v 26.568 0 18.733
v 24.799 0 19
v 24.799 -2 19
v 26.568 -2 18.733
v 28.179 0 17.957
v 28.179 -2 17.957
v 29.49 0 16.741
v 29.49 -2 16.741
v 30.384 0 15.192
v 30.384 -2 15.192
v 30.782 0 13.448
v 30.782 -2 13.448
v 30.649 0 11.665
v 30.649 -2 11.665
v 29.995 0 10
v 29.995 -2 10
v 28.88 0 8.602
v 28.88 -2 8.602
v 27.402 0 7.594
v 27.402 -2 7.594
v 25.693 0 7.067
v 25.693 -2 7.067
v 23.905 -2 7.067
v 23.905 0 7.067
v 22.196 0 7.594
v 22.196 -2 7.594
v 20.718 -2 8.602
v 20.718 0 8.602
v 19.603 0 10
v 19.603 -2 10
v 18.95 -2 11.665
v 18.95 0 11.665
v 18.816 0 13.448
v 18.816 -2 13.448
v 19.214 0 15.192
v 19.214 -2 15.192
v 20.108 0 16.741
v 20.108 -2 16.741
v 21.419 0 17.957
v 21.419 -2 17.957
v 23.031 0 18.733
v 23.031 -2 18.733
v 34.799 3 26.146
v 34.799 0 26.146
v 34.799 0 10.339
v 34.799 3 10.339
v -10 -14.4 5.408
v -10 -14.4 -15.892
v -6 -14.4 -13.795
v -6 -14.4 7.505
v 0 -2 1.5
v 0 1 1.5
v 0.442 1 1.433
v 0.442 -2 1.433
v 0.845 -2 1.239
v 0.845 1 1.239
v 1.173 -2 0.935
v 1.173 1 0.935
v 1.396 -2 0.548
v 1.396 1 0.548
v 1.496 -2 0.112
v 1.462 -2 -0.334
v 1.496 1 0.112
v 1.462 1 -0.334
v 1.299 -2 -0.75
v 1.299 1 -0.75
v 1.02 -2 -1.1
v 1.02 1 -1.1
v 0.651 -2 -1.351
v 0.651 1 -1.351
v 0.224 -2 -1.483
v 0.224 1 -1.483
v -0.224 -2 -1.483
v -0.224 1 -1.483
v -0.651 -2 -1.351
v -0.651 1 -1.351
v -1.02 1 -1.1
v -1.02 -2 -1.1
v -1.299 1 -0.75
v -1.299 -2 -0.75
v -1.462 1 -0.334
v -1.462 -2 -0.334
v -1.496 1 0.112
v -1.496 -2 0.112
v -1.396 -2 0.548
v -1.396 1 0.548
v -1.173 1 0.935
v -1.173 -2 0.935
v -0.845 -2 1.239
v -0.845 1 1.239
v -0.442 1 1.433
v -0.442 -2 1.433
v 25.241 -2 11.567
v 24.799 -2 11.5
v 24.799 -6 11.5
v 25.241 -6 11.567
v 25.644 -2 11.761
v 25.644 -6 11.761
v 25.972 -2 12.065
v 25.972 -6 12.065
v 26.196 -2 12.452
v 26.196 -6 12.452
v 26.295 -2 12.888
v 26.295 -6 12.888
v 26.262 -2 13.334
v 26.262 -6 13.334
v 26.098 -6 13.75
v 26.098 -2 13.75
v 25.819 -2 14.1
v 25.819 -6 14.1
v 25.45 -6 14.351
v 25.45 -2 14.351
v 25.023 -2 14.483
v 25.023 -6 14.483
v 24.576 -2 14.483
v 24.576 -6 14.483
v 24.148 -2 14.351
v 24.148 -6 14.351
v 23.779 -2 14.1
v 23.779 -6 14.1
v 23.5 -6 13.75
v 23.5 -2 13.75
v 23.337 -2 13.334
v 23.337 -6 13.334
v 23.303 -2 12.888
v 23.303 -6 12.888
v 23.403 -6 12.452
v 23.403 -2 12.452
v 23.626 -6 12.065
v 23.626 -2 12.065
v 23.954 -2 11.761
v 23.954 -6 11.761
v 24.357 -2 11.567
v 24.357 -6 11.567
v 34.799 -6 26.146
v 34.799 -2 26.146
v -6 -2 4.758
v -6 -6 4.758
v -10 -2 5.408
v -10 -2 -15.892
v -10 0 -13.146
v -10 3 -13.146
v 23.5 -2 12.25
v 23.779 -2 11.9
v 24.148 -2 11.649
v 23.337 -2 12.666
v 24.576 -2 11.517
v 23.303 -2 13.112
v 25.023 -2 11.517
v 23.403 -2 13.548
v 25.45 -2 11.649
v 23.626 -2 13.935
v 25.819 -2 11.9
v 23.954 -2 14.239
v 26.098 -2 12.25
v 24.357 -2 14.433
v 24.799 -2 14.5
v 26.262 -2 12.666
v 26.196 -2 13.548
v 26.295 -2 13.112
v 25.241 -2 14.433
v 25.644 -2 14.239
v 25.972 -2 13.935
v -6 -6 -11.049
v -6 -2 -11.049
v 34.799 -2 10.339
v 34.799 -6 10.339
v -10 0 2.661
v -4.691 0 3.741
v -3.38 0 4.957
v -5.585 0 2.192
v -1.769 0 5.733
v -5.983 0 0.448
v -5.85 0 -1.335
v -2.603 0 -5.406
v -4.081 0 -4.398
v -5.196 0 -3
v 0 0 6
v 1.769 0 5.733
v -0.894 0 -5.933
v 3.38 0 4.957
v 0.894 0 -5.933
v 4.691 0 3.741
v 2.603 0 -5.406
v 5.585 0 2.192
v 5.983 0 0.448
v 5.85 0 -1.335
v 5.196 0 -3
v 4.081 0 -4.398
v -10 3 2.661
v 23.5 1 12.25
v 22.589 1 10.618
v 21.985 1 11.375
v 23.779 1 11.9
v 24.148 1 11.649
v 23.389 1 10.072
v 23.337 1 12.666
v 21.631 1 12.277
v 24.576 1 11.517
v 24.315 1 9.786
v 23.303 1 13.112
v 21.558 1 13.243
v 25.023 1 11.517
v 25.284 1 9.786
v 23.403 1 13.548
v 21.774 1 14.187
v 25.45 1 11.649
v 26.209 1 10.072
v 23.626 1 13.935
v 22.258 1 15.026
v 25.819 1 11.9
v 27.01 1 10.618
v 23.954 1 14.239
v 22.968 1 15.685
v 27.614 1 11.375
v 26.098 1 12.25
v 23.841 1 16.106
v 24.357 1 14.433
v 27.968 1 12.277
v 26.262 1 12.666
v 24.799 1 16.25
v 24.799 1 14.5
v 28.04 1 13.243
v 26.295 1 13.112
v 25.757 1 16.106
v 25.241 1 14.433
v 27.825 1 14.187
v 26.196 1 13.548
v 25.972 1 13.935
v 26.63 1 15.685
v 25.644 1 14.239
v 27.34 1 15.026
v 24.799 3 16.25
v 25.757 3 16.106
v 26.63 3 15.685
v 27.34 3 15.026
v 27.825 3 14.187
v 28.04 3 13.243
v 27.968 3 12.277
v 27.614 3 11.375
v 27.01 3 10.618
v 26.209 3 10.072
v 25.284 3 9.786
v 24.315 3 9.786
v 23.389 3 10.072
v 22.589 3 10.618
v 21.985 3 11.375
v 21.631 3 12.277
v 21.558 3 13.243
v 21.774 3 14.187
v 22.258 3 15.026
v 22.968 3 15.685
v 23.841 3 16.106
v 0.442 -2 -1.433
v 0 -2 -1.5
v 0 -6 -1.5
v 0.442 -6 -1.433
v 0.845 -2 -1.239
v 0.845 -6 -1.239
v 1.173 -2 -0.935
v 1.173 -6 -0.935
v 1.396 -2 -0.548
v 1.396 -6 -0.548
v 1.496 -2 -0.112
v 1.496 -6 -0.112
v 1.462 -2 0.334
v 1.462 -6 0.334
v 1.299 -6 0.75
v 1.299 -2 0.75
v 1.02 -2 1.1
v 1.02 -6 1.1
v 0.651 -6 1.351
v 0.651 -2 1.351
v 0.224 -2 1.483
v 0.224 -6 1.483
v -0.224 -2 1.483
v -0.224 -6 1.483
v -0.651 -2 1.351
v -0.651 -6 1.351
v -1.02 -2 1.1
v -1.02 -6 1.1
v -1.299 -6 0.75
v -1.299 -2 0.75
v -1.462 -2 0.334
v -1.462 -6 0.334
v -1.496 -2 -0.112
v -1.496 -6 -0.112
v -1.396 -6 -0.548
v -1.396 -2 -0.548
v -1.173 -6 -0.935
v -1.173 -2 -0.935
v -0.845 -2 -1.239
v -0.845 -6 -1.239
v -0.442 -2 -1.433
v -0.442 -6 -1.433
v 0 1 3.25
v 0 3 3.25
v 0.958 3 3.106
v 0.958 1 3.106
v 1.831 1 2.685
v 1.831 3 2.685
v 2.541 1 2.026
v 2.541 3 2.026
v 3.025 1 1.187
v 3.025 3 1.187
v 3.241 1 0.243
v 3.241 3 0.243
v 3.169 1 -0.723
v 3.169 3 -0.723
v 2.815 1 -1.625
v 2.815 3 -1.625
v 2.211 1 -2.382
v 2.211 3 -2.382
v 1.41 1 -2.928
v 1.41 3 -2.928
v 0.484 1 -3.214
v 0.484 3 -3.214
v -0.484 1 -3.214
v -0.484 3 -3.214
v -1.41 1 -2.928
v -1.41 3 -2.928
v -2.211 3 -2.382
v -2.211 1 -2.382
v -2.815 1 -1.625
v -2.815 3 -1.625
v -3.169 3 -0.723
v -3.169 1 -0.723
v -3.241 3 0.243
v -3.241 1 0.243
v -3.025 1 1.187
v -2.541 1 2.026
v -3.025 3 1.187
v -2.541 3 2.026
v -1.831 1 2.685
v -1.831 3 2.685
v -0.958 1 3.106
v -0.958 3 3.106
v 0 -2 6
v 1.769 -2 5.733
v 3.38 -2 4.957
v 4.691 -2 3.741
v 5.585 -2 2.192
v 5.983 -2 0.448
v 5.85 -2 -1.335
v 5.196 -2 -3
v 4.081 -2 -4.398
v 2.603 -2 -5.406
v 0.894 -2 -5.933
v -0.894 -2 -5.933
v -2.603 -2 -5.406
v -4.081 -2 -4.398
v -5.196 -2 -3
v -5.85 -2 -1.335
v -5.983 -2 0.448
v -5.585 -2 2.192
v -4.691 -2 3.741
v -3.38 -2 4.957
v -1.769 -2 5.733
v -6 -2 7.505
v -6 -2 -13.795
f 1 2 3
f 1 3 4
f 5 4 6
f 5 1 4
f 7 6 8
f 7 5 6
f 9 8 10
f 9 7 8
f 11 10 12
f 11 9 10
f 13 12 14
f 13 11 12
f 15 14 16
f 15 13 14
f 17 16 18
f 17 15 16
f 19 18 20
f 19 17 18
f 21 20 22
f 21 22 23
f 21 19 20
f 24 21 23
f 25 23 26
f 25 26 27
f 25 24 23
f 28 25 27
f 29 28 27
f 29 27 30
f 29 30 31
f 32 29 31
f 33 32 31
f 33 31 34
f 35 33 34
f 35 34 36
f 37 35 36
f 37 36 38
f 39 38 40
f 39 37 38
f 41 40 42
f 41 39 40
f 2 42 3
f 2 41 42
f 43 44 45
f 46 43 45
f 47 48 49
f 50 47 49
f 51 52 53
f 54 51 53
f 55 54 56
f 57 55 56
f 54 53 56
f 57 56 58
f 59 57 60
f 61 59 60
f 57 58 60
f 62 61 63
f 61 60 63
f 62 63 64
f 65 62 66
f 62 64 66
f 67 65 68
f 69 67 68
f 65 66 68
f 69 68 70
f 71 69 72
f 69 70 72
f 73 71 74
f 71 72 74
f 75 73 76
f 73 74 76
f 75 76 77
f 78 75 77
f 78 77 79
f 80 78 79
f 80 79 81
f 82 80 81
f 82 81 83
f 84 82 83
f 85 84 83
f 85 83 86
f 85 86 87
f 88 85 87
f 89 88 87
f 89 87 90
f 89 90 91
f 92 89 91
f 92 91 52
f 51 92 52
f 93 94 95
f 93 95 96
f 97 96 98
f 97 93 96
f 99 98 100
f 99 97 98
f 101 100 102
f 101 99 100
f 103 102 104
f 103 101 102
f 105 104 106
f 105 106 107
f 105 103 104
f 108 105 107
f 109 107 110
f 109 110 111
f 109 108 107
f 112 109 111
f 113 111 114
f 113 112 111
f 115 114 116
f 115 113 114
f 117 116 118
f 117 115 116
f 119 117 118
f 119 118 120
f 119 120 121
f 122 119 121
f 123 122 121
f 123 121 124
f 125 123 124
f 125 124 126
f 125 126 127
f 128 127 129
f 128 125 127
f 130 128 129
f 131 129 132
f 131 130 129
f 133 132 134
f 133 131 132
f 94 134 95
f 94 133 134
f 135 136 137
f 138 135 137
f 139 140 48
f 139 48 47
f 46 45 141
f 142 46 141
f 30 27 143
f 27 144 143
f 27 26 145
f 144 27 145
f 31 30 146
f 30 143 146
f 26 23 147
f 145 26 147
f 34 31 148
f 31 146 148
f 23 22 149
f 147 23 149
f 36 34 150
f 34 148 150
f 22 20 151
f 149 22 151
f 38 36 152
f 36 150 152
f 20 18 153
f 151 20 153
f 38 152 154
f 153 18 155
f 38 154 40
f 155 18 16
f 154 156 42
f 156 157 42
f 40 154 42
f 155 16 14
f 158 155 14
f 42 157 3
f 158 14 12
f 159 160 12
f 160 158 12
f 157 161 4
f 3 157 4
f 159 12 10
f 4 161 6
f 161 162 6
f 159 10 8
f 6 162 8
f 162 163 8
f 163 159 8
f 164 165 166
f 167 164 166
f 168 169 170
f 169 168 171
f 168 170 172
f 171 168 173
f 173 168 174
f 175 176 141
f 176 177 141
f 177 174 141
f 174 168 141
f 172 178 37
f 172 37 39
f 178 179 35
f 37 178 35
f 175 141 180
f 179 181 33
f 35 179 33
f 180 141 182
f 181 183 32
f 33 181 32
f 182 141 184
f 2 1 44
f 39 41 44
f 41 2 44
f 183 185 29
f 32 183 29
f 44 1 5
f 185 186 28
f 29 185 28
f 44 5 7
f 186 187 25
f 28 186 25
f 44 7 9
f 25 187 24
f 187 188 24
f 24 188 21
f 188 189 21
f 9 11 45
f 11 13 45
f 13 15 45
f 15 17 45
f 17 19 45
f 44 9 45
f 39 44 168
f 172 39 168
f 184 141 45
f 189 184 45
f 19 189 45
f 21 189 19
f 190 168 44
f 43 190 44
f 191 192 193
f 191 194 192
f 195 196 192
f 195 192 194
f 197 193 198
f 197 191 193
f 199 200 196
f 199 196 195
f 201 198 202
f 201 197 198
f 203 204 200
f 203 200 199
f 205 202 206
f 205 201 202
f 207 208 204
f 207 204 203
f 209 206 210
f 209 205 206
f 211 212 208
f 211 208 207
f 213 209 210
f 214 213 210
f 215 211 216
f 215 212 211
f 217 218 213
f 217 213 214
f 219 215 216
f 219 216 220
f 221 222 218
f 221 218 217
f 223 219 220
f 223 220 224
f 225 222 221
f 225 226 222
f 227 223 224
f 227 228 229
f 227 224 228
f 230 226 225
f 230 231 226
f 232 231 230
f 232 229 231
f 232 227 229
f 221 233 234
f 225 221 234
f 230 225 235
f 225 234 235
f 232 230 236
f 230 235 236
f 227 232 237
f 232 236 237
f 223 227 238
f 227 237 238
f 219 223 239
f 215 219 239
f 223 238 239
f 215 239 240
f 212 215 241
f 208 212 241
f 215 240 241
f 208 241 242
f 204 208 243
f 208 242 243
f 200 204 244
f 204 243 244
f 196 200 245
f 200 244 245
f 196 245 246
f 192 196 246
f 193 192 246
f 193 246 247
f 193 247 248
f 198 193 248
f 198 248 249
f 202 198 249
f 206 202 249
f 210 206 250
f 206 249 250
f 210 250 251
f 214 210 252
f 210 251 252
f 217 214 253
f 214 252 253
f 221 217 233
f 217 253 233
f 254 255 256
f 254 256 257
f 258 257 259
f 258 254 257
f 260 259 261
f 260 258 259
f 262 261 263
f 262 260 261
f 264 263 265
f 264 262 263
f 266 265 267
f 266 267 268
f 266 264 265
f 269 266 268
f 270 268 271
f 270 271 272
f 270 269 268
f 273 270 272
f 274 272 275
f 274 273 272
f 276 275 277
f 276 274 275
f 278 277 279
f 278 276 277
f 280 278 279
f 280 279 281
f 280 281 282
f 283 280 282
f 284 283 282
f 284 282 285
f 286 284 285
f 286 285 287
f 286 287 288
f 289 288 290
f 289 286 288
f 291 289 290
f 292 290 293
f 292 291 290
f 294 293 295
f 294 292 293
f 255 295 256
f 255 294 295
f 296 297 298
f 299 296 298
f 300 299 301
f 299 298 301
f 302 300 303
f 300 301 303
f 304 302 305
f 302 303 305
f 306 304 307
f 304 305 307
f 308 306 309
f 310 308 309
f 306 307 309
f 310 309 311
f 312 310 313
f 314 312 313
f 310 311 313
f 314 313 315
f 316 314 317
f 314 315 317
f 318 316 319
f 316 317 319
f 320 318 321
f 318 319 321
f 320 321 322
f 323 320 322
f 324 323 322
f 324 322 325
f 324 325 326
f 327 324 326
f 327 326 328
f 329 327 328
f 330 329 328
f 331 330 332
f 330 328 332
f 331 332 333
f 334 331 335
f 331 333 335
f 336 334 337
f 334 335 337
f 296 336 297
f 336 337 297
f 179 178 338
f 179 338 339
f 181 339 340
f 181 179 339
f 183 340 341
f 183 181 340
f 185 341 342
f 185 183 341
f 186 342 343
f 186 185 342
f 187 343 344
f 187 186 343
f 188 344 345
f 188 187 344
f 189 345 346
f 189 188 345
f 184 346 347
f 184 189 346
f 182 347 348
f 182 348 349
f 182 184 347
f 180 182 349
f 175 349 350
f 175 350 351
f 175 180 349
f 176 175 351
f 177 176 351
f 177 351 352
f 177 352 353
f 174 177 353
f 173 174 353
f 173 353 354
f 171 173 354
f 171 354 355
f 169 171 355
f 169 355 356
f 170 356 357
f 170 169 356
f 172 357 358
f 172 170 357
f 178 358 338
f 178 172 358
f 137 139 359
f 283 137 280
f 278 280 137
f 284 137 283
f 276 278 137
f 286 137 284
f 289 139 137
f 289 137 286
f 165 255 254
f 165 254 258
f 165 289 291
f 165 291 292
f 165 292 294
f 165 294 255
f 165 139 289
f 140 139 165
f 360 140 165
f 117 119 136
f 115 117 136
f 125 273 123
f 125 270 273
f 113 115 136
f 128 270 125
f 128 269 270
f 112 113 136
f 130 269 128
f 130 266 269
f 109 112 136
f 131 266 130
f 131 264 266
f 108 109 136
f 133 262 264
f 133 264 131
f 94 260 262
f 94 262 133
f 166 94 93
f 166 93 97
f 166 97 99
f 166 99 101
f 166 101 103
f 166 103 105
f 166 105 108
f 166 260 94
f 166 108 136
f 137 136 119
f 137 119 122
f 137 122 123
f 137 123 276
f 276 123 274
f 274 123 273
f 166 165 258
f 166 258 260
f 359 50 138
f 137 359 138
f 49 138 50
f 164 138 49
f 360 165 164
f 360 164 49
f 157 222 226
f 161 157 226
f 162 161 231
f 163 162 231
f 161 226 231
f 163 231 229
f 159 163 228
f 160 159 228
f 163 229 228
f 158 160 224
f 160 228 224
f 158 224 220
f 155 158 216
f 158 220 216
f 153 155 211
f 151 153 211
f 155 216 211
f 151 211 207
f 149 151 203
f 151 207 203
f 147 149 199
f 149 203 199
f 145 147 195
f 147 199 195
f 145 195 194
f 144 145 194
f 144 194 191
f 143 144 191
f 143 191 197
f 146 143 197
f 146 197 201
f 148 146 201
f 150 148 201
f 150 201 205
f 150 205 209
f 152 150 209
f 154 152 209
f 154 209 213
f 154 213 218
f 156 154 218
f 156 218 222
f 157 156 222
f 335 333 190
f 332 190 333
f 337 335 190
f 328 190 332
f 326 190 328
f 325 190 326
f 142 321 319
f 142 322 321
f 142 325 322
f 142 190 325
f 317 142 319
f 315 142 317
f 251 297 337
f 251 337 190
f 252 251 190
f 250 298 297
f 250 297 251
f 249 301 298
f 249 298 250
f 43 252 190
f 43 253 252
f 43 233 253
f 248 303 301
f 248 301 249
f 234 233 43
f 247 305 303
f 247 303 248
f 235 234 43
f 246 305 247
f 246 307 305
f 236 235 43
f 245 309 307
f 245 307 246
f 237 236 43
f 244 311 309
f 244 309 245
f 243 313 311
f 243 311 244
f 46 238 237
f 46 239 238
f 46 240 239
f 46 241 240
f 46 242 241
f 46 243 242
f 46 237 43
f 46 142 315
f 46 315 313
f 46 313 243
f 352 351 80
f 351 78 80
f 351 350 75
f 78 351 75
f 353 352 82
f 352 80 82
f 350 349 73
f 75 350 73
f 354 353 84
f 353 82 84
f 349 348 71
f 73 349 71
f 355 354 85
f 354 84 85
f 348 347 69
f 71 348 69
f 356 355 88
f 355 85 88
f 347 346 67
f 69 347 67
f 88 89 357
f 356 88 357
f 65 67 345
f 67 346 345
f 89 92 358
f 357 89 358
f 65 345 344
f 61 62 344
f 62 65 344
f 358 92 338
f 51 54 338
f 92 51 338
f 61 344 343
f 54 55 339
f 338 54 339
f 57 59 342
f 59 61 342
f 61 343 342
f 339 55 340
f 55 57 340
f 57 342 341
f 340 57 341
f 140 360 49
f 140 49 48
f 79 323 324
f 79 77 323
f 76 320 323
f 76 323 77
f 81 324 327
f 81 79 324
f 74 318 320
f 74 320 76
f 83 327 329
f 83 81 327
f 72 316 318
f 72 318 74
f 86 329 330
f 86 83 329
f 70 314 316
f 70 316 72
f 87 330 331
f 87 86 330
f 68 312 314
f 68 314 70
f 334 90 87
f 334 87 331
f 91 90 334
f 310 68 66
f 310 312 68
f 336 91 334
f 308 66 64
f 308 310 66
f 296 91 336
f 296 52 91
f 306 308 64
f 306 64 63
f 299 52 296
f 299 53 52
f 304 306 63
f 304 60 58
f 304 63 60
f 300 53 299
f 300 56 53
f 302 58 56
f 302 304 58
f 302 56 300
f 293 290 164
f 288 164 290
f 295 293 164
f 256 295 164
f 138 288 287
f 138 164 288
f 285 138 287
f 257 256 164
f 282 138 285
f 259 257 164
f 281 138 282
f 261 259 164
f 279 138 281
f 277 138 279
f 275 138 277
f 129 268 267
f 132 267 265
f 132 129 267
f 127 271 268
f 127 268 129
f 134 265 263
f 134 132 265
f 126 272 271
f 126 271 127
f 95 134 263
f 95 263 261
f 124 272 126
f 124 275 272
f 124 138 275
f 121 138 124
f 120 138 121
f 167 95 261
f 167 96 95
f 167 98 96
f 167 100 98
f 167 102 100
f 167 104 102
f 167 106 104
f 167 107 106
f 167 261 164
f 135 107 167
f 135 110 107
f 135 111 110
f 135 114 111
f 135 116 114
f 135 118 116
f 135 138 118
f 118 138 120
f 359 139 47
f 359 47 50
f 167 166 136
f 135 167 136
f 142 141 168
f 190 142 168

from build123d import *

# Parameters (mm, degrees)
BOSS_EXTRUDE1_DEPTH = 3
SKETCH1_R           = 6
BOSS_EXTRUDE3_DEPTH = 2
SKETCH4_R           = 1.5
CUT_EXTRUDE1_DEPTH  = 44.812962497
SKETCH5_R           = 3.25
CUT_EXTRUDE2_DEPTH  = 2
SKETCH6_R           = 1.5
BOSS_EXTRUDE4_DEPTH = 4
BOSS_EXTRUDE5_DEPTH = 12.4


with BuildPart() as part:
    # Sketch3 → Boss-Extrude1 (new body)
    with BuildSketch(Plane(origin=(0, 0, 0), x_dir=(1, 0, 0), z_dir=(0, 1, 0))):
        Polygon((-10, 13.145588768), (-10, -2.661376867), (34.799193535, -26.145588768), (34.799193535, -10.338623133), align=None)
    extrude(amount=BOSS_EXTRUDE1_DEPTH)

    # Sketch1 → Boss-Extrude3 (add)
    with BuildSketch(Plane(origin=(0, 0, 0), x_dir=(1, 0, 0), z_dir=(0, 1, 0))):
        with Locations(Location((0, 0, 0), (0, 0, 270))):
            Circle(SKETCH1_R)
        with Locations(Location((24.799193535, -13, 0), (0, 0, 270))):
            Circle(SKETCH1_R)
    extrude(amount=-BOSS_EXTRUDE3_DEPTH)

    # Sketch4 → Cut-Extrude1 (cut, through all)
    with BuildSketch(Plane(origin=(0, 3, 0), x_dir=(1, 0, 0), z_dir=(0, 1, 0))):
        with Locations(Location((0, 0, 0), (0, 0, 270))):
            Circle(SKETCH4_R)
        with Locations(Location((24.799193535, -13, 0), (0, 0, 270))):
            Circle(SKETCH4_R)
    extrude(amount=-CUT_EXTRUDE1_DEPTH, mode=Mode.SUBTRACT)

    # Sketch5 → Cut-Extrude2 (cut)
    with BuildSketch(Plane(origin=(0, 3, 0), x_dir=(1, 0, 0), z_dir=(0, 1, 0))):
        with Locations(Location((0, 0, 0), (0, 0, 270))):
            Circle(SKETCH5_R)
        with Locations(Location((24.799193535, -13, 0), (0, 0, 270))):
            Circle(SKETCH5_R)
    extrude(amount=-CUT_EXTRUDE2_DEPTH, mode=Mode.SUBTRACT)


with BuildPart() as body_2:
    # Sketch6 → Boss-Extrude4 (new body)
    with BuildSketch(Plane.XZ.offset(2)):
        Polygon((-10, 2.661376867), (-10, -13.145588768), (34.799193535, 10.338623133), (34.799193535, 26.145588768), align=None)
        with Locations(Location((0, 0, 0), (0, 0, 270))):
            Circle(SKETCH6_R, mode=Mode.SUBTRACT)
        with Locations(Location((24.799193535, 13, 0), (0, 0, 270))):
            Circle(SKETCH6_R, mode=Mode.SUBTRACT)
    extrude(amount=BOSS_EXTRUDE4_DEPTH)

    # Sketch7 → Boss-Extrude5 (add)
    with BuildSketch(Plane(origin=(0, -2, 0), x_dir=(1, 0, 0), z_dir=(0, 1, 0))):
        Polygon((-10, 15.892105951), (-10, -5.407894049), (-6, -7.50473643), (-6, 13.79526357), align=None)
    extrude(amount=-BOSS_EXTRUDE5_DEPTH)


solid = Compound([part.part, body_2.part])
